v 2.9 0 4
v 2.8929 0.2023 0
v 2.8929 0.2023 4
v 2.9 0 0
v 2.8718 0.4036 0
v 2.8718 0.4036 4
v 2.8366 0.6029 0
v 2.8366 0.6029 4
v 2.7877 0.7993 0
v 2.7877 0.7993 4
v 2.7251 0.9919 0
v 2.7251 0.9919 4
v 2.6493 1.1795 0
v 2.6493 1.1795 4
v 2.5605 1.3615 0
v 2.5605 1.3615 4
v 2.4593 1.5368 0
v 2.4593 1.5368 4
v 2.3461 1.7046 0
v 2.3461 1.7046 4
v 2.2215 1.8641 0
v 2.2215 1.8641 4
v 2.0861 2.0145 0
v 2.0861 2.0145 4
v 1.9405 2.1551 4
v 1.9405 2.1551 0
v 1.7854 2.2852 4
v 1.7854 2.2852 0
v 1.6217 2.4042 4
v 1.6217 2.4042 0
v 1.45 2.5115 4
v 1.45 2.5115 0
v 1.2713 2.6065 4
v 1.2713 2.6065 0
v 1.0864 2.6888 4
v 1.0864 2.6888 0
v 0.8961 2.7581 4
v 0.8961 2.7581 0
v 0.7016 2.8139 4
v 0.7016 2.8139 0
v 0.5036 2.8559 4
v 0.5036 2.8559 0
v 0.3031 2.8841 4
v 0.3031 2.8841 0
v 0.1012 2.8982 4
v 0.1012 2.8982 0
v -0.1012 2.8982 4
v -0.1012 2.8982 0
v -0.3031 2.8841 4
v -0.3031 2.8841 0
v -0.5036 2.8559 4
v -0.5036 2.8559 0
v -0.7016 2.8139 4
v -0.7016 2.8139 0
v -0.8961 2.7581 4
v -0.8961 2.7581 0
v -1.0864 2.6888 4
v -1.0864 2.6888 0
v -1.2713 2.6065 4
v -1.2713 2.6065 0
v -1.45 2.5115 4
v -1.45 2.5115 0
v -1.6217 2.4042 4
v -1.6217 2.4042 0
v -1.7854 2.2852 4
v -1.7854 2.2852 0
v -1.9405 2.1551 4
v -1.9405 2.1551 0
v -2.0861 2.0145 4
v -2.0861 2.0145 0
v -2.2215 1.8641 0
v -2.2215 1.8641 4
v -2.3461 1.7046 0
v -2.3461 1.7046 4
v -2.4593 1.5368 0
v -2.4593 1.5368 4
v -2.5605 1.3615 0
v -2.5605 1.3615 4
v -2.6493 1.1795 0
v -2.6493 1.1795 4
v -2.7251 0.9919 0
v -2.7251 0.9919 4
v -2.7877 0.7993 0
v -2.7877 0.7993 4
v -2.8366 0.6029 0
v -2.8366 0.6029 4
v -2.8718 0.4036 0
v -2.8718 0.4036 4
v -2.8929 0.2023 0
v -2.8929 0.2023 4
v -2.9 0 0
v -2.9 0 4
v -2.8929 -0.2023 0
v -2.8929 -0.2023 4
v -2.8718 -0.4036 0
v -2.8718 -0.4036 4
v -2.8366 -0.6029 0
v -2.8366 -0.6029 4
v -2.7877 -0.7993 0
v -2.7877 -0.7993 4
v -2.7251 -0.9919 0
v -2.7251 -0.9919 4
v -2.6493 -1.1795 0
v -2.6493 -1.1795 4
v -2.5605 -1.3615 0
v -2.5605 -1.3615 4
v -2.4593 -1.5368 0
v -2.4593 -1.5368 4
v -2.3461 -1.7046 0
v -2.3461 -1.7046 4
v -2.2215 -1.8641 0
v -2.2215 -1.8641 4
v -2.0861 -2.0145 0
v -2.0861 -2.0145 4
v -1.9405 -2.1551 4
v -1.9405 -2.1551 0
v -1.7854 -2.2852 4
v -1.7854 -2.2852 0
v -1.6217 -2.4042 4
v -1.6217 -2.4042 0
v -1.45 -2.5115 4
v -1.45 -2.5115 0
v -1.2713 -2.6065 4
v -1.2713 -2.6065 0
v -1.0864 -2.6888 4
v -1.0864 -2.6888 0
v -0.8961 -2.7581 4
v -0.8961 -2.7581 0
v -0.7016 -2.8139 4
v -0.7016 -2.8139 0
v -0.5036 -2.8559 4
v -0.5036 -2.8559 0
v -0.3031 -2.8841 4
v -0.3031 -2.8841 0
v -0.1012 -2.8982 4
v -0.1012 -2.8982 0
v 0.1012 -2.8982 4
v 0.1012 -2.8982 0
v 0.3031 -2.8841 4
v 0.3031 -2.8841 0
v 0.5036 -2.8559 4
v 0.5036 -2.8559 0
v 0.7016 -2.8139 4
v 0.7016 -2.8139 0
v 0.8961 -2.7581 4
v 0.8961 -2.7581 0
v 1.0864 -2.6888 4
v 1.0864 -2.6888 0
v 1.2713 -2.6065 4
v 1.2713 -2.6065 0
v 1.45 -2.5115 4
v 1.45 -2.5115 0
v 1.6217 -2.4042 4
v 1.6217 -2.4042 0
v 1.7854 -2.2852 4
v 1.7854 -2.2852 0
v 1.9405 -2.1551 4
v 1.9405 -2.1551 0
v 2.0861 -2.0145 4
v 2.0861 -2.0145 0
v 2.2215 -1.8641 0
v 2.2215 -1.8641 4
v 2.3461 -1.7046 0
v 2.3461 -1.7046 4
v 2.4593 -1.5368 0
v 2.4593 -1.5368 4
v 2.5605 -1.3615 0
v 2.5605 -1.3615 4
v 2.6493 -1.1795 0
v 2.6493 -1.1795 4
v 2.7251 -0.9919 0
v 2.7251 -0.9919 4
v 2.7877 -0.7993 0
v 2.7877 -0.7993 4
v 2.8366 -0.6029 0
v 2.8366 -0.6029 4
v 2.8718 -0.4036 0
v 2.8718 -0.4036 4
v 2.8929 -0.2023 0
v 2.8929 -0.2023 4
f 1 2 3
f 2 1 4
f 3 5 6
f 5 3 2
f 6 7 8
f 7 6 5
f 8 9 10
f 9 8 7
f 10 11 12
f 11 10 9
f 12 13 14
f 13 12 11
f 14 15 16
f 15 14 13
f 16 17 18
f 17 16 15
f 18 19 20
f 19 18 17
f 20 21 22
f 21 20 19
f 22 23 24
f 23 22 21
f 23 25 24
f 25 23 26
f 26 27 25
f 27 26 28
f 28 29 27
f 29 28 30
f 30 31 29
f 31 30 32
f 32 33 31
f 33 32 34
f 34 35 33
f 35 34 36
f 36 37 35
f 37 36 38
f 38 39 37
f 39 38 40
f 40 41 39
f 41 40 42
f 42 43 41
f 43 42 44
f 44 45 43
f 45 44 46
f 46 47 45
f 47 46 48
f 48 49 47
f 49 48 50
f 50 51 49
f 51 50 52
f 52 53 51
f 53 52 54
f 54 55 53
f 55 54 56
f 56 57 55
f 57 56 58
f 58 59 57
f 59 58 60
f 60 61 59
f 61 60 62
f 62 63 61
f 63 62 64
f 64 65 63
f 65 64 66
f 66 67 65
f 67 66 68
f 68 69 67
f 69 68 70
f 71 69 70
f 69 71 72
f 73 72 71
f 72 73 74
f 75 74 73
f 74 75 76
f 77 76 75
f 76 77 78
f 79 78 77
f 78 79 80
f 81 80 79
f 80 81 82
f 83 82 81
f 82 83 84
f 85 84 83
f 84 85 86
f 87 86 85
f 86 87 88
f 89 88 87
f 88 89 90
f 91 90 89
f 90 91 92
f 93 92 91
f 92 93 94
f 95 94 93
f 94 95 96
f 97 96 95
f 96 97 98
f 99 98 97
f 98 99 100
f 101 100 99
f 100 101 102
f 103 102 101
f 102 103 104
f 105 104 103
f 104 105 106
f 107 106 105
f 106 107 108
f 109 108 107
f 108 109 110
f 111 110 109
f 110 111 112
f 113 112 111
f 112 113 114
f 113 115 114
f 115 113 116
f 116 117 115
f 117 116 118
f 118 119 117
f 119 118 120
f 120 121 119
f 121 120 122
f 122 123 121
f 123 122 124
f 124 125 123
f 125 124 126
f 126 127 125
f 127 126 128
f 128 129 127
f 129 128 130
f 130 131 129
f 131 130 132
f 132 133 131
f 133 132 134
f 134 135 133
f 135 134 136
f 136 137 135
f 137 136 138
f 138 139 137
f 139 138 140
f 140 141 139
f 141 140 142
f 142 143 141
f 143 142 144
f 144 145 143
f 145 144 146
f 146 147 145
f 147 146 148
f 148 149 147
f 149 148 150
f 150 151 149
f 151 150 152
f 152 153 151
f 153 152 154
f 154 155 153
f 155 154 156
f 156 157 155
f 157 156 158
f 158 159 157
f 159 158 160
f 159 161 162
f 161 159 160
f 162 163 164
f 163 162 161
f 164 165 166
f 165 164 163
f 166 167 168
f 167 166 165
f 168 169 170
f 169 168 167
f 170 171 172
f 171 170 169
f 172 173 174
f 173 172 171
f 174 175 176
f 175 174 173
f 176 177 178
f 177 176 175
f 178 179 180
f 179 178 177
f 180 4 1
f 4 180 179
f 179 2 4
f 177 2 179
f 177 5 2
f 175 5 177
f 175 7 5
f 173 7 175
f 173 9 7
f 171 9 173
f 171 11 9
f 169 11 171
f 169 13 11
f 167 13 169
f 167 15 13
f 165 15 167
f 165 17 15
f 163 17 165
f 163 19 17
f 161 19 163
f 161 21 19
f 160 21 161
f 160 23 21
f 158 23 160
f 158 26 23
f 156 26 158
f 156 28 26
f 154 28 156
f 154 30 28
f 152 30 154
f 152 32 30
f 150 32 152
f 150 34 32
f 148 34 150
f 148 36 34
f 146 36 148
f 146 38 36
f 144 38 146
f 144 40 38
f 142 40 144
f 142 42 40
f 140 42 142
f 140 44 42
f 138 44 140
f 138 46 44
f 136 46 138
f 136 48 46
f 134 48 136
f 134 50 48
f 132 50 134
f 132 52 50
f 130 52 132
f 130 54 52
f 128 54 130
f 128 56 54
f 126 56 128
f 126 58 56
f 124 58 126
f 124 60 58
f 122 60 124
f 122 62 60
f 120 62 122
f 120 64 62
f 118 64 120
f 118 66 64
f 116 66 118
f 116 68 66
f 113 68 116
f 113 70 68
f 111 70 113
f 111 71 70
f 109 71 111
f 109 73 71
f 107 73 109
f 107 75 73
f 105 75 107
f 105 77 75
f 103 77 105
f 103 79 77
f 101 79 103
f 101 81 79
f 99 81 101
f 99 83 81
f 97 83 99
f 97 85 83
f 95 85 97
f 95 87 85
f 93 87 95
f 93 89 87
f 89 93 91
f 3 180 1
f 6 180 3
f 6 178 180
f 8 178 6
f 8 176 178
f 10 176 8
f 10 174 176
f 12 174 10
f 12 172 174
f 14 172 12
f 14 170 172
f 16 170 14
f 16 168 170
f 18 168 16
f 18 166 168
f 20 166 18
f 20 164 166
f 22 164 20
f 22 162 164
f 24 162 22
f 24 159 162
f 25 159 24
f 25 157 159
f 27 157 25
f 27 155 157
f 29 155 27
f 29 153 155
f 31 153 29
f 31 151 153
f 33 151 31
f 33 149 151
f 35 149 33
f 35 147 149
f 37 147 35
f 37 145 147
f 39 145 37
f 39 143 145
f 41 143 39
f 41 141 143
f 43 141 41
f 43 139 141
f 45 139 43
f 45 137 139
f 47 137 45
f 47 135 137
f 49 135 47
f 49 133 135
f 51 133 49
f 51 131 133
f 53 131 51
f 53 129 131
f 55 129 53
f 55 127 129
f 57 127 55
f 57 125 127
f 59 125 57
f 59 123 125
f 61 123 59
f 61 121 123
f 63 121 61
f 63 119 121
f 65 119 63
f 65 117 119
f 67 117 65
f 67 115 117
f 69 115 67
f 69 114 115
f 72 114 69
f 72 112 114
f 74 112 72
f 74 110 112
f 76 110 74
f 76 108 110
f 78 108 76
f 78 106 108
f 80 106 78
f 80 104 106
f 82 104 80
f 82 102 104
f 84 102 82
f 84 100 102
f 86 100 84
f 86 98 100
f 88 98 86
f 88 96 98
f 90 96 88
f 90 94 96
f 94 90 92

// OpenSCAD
translate ([0, 0, 2.0]) {
  cylinder ($fn=90, h=4.0, r=2.9, center=true);
}
